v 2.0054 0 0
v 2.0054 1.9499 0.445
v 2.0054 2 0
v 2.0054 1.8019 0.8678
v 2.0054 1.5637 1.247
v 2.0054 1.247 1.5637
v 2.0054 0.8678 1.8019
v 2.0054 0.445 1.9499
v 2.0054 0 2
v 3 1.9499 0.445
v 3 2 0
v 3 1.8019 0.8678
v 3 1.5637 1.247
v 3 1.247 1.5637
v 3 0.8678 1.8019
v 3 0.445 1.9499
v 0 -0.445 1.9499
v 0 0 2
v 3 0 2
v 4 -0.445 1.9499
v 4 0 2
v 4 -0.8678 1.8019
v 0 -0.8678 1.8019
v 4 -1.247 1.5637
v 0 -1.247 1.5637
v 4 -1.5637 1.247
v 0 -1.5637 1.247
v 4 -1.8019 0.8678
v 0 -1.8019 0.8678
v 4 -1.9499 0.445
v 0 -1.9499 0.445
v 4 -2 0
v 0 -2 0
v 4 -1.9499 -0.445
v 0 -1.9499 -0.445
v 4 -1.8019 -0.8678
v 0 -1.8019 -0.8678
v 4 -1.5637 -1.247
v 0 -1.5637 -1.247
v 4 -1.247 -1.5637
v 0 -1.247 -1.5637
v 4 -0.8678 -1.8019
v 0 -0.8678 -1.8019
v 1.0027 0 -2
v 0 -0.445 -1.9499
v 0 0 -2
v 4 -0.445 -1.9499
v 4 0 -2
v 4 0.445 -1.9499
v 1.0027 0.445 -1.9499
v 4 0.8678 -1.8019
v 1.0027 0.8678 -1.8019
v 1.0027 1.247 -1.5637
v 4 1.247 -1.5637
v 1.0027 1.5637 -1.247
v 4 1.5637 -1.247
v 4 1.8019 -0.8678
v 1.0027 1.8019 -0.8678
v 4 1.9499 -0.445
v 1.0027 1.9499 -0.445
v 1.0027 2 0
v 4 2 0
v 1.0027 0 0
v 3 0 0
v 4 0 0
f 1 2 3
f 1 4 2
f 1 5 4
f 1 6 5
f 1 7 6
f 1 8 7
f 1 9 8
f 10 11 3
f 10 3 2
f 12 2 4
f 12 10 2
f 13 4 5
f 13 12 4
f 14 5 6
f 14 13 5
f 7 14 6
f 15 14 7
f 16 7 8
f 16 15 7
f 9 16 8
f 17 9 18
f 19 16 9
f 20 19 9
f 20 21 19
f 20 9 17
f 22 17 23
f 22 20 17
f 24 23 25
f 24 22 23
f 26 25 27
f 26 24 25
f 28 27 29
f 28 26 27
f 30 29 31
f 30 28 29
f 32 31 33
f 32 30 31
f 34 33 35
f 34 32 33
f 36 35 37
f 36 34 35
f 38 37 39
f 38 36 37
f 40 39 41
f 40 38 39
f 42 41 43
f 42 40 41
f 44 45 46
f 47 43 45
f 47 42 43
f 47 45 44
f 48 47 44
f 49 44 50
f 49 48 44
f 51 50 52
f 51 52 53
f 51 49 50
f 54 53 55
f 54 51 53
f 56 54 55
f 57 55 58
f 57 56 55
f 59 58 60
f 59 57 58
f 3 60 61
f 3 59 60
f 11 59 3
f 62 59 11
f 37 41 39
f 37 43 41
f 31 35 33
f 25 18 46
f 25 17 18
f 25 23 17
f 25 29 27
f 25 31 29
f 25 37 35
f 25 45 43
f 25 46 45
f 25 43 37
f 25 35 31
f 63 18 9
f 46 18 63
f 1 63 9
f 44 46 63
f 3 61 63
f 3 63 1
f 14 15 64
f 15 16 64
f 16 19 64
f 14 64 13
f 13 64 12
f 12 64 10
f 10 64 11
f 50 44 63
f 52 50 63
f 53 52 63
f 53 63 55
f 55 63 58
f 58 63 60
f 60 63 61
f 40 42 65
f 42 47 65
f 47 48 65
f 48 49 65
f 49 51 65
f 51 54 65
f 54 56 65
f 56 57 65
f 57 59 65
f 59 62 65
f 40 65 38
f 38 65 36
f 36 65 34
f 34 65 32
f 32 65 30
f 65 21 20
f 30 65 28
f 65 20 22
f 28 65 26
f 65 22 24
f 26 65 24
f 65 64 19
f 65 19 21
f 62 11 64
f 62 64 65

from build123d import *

# Parameters (mm, degrees)
SKETCH5_W          = 4
SKETCH5_H          = 2
SKETCH6_W          = 1
SKETCH6_H          = 2
CUT_EXTRUDE5_DEPTH = 11
SKETCH7_W          = 1.005381091
SKETCH7_H          = 2
CUT_EXTRUDE6_DEPTH = 3
SKETCH8_W          = 1.002690545
SKETCH8_H          = 2
CUT_EXTRUDE7_DEPTH = 10


with BuildPart() as part:
    # Sketch5 → Revolve-Thin2 (revolve)
    with BuildSketch(Plane.XY):
        with Locations((2, 1)):
            Rectangle(SKETCH5_W, SKETCH5_H)
    revolve(axis=Axis((0, 0, 0), (1, 0, 0)))

    # Sketch6 → Cut-Extrude5 (cut)
    with BuildSketch(Plane.XY):
        with Locations((3.5, 1)):
            Rectangle(SKETCH6_W, SKETCH6_H)
        with Locations((0.5, 1)):
            Rectangle(SKETCH6_W, SKETCH6_H)
    extrude(amount=CUT_EXTRUDE5_DEPTH, mode=Mode.SUBTRACT)

    # Sketch7 → Cut-Extrude6 (cut)
    with BuildSketch(Plane(origin=(0, 0, 0), x_dir=(1, 0, 0), z_dir=(0, 1, 0))):
        with Locations((1.502690546, -1)):
            Rectangle(SKETCH7_W, SKETCH7_H)
    extrude(amount=CUT_EXTRUDE6_DEPTH, mode=Mode.SUBTRACT)

    # Sketch8 → Cut-Extrude7 (cut)
    with BuildSketch(Plane.XY):
        with Locations((0.501345273, 1)):
            Rectangle(SKETCH8_W, SKETCH8_H)
    extrude(amount=-CUT_EXTRUDE7_DEPTH, mode=Mode.SUBTRACT)


solid = part.part
